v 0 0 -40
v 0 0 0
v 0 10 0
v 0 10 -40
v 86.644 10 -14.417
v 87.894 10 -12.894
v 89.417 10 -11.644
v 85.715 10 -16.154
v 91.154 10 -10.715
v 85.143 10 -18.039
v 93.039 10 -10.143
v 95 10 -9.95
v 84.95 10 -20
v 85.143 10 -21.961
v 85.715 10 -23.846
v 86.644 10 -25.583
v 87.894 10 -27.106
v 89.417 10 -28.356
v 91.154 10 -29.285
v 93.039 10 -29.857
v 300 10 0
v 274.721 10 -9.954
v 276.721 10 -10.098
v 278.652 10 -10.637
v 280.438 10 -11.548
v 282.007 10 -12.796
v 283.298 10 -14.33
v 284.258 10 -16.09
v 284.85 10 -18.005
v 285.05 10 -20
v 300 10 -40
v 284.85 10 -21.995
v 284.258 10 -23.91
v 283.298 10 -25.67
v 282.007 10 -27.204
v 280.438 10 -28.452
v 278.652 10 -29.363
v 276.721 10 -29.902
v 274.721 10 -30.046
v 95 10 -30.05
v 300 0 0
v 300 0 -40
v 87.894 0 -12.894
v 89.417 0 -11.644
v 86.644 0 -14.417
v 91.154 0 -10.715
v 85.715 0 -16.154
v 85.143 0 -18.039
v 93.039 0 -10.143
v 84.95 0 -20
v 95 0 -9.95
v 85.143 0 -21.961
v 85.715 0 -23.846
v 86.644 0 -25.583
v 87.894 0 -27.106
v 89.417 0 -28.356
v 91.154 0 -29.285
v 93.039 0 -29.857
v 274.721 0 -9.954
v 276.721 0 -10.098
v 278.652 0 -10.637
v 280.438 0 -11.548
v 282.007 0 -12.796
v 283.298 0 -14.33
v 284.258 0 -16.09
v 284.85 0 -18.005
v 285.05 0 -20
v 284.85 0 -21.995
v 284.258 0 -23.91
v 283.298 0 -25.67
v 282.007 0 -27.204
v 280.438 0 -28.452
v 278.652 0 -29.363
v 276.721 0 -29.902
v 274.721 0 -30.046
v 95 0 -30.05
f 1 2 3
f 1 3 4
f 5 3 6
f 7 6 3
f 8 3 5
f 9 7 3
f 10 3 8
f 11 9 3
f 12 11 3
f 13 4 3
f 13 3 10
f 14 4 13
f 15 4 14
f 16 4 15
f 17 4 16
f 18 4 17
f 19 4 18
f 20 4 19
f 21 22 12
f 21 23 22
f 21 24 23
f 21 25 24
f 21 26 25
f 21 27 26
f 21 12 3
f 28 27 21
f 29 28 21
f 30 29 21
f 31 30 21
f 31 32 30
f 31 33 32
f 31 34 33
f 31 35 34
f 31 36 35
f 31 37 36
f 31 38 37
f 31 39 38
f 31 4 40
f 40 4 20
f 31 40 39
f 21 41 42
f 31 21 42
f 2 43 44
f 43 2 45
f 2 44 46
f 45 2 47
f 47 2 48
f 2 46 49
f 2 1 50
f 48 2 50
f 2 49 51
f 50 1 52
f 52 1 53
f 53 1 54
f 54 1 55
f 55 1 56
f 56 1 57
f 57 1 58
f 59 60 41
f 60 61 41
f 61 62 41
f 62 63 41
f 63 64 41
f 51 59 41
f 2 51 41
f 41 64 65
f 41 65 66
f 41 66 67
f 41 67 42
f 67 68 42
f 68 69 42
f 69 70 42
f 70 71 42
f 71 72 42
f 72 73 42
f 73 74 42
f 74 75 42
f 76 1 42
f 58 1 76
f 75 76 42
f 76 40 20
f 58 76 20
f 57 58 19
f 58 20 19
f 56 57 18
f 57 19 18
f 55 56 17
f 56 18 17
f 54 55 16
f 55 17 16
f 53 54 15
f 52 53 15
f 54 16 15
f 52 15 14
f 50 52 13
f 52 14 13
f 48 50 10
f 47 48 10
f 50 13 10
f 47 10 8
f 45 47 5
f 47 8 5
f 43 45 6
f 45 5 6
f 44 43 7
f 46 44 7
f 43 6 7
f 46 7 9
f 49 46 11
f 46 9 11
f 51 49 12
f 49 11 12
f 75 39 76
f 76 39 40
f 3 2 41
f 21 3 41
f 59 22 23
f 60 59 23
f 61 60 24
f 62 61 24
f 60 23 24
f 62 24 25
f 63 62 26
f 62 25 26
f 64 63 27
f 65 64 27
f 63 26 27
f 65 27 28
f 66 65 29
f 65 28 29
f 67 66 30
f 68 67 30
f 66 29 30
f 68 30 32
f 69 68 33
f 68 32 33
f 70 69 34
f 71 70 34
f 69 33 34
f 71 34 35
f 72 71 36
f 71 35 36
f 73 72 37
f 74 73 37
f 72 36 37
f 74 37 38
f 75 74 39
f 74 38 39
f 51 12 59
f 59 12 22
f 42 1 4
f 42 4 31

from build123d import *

# Parameters (mm, degrees)
SKETCH_1_W          = 300
SKETCH_1_H          = 40
EXTRUDE_1_DEPTH     = 10
CUT_EXTRUDE_1_REACH = 12


with BuildPart() as part:
    # Эскиз1 → Бобышка-Вытянуть1 (new body)
    with BuildSketch(Plane(origin=(0, 0, 0), x_dir=(1, 0, 0), z_dir=(0, 1, 0))):
        with Locations((150, 20)):
            Rectangle(SKETCH_1_W, SKETCH_1_H)
    extrude(amount=EXTRUDE_1_DEPTH)

    # Эскиз2 → Вырез-Вытянуть1 (cut, up to next)
    with BuildSketch(Plane(origin=(0, 10, 0), x_dir=(1, 0, 0), z_dir=(0, 1, 0)), mode=Mode.PRIVATE) as cut_extrude_1_sk1:
        with BuildLine():
            Line((95, 9.95), (274.721446052, 9.953861055))
            ThreePointArc((274.721446052, 9.953861055), (285.05, 20), (274.721446052, 30.046138945))
            Line((274.721446052, 30.046138945), (95, 30.05))
            ThreePointArc((95, 30.05), (84.95, 20), (95, 9.95))
        make_face()
    cut_extrude_1_tool1 = extrude(cut_extrude_1_sk1.sketch, amount=-CUT_EXTRUDE_1_REACH, mode=Mode.PRIVATE) & part.part
    add(cut_extrude_1_tool1.solids().sort_by_distance((184.994726, 10, -20))[0], mode=Mode.SUBTRACT)


solid = part.part
